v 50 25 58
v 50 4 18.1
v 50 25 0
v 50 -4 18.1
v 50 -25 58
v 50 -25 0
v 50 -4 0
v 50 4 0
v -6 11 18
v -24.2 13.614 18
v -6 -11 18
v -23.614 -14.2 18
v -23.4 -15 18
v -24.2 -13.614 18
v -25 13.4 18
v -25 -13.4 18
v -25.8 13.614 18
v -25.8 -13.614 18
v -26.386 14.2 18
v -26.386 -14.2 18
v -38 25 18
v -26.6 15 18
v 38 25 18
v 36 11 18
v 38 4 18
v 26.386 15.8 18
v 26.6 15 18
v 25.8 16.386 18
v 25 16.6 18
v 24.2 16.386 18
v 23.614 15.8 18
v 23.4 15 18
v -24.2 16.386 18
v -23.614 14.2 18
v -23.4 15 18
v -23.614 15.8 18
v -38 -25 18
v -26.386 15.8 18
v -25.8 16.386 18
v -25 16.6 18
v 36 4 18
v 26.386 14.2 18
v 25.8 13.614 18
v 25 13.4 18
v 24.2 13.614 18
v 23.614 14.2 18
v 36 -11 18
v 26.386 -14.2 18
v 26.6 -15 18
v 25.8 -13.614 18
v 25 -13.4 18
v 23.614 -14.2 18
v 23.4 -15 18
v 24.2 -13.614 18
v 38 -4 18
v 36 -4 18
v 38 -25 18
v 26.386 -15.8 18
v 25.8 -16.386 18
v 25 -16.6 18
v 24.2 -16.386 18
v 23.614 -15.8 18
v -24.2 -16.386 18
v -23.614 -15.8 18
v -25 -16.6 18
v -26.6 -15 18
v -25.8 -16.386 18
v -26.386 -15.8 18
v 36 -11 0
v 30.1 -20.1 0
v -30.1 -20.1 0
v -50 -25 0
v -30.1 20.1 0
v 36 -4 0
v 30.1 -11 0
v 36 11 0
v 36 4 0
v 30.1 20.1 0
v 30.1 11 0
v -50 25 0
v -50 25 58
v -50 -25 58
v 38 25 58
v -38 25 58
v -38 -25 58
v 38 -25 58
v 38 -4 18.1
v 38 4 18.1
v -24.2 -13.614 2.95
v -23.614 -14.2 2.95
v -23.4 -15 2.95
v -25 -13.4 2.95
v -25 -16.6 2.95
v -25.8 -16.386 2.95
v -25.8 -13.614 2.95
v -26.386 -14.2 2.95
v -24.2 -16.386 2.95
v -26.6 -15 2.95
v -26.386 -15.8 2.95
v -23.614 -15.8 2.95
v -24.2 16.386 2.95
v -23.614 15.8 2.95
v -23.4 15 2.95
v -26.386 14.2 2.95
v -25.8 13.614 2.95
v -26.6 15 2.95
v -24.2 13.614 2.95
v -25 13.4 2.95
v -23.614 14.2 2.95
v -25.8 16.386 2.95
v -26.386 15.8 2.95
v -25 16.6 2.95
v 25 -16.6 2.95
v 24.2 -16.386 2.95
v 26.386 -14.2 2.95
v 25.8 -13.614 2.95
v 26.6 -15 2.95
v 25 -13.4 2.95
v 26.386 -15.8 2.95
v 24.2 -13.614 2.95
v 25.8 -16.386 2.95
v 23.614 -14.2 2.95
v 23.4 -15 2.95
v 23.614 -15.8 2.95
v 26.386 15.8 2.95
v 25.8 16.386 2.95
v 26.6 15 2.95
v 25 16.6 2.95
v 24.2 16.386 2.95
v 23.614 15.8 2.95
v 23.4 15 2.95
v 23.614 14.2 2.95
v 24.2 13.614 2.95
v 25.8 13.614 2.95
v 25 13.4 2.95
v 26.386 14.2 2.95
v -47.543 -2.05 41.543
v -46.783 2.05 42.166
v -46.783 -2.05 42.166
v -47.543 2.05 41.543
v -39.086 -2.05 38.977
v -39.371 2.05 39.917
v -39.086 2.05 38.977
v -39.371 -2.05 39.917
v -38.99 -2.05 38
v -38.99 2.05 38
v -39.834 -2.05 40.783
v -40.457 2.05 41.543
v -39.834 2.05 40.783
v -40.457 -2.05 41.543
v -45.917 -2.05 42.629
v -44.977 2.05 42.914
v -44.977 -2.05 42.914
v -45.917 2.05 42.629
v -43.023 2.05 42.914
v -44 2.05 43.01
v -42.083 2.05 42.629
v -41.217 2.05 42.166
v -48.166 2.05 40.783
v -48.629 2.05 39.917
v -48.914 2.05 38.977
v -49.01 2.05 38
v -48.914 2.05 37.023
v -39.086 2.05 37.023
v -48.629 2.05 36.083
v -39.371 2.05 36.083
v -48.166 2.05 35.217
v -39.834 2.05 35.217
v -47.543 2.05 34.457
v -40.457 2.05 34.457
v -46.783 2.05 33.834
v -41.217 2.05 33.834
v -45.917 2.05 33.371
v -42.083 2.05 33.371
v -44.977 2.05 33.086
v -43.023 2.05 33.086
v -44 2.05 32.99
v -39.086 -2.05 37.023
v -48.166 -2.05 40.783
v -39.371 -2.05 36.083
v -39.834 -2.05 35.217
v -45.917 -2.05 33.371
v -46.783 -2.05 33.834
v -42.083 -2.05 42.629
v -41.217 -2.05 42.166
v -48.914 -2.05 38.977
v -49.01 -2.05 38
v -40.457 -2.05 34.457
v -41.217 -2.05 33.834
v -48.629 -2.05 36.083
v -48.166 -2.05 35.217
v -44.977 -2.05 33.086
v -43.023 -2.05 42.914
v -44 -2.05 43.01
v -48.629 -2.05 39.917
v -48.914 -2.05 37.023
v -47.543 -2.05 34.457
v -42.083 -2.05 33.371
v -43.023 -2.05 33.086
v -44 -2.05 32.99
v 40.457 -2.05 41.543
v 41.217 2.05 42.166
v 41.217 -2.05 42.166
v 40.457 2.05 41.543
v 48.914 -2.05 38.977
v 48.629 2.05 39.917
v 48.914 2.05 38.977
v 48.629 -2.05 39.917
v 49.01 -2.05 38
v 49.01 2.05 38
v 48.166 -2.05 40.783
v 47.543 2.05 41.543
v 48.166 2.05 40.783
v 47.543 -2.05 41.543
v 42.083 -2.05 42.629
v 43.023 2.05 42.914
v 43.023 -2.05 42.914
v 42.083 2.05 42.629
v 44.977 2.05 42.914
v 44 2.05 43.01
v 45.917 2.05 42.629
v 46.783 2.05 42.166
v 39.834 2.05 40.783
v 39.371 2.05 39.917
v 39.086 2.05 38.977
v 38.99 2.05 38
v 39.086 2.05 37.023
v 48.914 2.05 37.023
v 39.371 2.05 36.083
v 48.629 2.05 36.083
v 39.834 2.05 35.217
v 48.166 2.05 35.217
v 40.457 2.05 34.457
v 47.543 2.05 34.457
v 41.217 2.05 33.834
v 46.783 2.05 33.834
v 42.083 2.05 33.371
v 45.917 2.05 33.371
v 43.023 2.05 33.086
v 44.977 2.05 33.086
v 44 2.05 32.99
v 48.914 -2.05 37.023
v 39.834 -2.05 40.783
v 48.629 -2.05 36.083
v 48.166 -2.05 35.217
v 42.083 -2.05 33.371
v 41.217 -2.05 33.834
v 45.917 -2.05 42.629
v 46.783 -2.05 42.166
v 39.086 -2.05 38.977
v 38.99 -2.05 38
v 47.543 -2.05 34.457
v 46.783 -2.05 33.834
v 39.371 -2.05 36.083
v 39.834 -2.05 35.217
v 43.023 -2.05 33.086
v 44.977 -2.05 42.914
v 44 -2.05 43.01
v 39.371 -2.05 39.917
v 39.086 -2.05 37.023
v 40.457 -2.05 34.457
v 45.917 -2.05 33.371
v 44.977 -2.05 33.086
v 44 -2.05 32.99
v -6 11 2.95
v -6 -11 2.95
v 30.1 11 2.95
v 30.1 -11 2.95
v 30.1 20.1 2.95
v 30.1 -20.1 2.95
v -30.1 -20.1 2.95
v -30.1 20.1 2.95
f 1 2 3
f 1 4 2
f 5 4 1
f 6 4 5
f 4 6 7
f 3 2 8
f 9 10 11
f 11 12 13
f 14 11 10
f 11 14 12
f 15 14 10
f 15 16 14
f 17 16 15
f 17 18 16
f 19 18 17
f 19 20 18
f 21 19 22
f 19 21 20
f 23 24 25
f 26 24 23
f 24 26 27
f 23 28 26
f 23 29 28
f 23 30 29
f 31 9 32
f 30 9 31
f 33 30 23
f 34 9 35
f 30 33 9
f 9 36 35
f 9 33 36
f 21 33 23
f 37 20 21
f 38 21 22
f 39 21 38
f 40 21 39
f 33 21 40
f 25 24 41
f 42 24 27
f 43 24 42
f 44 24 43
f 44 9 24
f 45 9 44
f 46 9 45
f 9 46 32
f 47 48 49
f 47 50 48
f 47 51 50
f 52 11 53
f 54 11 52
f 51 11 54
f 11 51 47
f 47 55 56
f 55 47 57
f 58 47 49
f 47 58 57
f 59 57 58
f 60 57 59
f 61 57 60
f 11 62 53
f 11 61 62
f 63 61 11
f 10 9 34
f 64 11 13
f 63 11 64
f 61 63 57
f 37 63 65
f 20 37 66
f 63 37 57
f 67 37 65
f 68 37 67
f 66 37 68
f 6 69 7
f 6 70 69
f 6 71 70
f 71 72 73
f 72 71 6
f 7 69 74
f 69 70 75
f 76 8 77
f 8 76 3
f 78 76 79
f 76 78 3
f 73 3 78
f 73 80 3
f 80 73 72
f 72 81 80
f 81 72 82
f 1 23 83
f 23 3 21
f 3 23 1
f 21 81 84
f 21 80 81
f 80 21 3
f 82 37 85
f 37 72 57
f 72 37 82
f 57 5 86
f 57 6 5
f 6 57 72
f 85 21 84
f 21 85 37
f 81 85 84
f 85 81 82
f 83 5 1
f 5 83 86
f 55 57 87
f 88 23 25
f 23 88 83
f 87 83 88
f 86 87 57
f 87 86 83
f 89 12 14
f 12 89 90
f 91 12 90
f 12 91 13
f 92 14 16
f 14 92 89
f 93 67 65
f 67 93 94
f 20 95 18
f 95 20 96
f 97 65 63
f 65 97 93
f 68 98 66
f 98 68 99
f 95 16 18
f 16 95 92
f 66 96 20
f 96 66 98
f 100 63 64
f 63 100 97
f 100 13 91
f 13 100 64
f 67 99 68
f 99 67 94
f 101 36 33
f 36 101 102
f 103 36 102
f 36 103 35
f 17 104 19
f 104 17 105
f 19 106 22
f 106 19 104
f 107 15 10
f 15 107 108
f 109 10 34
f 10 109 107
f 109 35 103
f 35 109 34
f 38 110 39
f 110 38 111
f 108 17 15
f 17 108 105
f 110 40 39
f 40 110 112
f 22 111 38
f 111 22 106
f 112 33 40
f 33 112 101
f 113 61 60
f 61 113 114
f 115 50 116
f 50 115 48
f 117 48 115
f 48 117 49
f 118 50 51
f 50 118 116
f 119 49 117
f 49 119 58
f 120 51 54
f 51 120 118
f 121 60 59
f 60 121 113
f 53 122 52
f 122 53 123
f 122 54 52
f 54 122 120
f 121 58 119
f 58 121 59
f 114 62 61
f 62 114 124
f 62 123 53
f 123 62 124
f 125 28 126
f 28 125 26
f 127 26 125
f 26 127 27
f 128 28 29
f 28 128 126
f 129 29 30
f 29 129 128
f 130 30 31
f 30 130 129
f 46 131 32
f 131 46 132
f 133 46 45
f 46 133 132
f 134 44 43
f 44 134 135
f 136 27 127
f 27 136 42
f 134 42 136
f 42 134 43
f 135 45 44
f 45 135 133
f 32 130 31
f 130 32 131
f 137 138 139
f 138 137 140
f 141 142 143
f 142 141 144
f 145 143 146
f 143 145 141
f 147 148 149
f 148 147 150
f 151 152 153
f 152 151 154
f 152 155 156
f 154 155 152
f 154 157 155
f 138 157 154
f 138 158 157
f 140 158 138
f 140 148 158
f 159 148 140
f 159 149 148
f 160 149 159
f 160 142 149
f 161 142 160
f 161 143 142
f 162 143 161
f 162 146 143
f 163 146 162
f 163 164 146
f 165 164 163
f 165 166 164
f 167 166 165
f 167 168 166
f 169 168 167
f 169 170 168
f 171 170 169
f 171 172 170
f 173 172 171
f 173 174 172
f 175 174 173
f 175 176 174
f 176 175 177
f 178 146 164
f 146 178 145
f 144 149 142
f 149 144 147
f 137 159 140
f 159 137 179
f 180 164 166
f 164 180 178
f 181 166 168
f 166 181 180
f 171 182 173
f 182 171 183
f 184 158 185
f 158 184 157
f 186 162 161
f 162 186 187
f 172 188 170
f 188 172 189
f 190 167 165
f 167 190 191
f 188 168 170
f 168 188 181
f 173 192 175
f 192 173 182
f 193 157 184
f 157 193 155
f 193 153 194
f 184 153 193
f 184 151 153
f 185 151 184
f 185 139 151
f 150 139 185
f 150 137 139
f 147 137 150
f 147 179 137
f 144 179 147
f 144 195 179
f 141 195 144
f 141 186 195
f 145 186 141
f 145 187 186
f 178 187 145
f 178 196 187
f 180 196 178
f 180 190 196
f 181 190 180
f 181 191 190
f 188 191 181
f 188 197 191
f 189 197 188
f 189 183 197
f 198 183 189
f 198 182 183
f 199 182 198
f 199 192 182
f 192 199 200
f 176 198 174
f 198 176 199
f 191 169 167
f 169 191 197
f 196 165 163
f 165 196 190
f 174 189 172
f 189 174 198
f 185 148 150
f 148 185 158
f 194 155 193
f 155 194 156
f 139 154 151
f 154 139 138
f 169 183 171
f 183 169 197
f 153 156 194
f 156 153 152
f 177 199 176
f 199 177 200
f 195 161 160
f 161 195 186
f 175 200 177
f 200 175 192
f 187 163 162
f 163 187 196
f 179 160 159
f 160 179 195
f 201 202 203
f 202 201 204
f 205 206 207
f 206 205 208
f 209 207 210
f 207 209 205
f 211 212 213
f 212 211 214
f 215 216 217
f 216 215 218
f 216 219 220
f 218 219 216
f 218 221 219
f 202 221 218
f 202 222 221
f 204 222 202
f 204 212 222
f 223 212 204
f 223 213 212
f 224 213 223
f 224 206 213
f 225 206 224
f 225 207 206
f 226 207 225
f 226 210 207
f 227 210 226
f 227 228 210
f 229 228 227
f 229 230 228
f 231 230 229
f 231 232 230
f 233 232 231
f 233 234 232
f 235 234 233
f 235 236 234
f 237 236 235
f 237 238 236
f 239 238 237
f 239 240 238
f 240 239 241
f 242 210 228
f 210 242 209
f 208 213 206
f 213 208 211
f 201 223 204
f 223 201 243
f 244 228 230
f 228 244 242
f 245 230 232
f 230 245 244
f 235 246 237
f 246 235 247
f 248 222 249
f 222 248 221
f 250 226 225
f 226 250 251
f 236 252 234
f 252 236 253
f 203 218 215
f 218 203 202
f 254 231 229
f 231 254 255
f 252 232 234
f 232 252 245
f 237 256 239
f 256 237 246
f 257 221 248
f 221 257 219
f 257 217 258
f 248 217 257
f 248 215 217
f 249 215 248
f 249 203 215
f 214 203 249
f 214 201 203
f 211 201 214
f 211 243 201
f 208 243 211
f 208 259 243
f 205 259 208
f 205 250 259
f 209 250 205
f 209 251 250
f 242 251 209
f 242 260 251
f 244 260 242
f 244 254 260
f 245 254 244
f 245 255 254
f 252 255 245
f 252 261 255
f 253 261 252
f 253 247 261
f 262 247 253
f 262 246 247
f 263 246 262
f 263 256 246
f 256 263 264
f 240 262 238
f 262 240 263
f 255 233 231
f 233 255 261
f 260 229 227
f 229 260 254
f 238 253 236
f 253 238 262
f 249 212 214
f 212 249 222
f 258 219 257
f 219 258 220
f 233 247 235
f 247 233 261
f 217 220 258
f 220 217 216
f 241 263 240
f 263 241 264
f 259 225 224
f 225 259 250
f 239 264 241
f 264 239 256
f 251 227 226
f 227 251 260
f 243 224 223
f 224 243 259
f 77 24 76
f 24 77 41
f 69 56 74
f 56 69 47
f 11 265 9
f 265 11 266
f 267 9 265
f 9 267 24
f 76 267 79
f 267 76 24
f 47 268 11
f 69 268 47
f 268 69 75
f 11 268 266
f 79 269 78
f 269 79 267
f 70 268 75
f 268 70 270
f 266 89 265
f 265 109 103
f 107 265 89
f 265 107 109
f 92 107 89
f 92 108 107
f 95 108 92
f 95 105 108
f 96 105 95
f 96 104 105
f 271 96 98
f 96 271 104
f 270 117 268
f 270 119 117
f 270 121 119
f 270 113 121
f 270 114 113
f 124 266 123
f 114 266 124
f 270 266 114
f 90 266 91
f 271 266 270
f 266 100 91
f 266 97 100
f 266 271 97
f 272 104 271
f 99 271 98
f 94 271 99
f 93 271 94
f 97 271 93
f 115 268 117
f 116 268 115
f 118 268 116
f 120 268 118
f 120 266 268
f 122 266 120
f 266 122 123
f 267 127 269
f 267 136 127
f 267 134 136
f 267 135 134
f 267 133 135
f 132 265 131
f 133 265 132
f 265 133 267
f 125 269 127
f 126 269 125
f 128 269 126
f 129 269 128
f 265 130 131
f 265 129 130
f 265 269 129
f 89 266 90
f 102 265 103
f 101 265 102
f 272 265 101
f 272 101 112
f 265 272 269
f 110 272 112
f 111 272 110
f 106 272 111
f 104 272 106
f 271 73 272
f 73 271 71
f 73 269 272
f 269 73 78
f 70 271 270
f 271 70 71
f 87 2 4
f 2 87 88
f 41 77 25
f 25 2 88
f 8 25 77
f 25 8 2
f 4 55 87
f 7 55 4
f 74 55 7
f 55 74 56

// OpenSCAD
// ===========================================================================
// HULL-FRAME COORDINATE STANDARD - Rev R1 (2026-06-11).  See CLAUDE.md.
//   Hull frame (canonical for ALL design artifacts): X = +port (left),
//   Y = +aft (back), Z = +dorsal (up); origin = SerenityAssembly.FCStd
//   world origin.  Primary-component STLs published to airframe/stls/
//   are stored directly in hull frame, baked by tools/bake_hull_frame.py
//   (marker 'SerenityUAV HULL-FRAME R1' in the binary STL header).
//   NEVER re-bake a mesh derived from an already-baked file.
//   This file:
//     Skipper ground-support equipment - part-local print frame.  The
//     aircraft hull-frame standard does not apply to GCS hardware
//     (documented exception, like the avionics KiCad files).
// ===========================================================================
/*
 * skipper_gimbal_tilt.scad
 * Tilt (elevation) stage for Skipper GCS directional antenna gimbal
 *
 * Author:  Steve Griffing, PE(CSE), CISSP-ISSEP, CPP
 * License: CERN-OHL-W-2.0 — see LICENSES/CERN-OHL-W 2.0 (SPDX-License-Identifier: CERN-OHL-W-2.0)
 * Revision: R (2026-06-11)
 *
 * Description:
 *   The tilt stage rotates the antenna mounting plate about the horizontal
 *   (Y) axis.  It consists of:
 *     - Yoke frame that bolts to the pan turret top boss
 *     - Antenna mount plate (from skipper_gimbal_mount.scad) pivots on a
 *       4 mm CF pivot rod through two MF104ZZ bearings in the yoke ears
 *     - DS3218MG servo mounted in the yoke body, driving the mount plate
 *       via a pushrod / sector gear
 *     - AS5600 magnetic encoder in the yoke, reading a disc magnet on the
 *       pivot rod for elevation position feedback
 *     - Travel limits: −10° (10° below horizontal) to +90° (vertical up)
 *       Hard stops at −15° and +95° (printed into yoke walls)
 *
 * Material: CF-PETG, 0.15 mm layers, 40% infill, 4 perimeters
 *
 * Mesh verification: run after every geometry change.
 *   openscad -o skipper_gimbal_tilt.stl skipper_gimbal_tilt.scad
 *   python3 tools/validate_stls.py
 */

/* ---------------------------------------------------------------------------
 * Render mode: 0 = yoke, 1 = pivot arm stub (attach to mount plate), 2 = exploded
 * ---------------------------------------------------------------------------*/
RENDER_MODE = 0;

/* ---------------------------------------------------------------------------
 * Pivot rod and bearings (same MF104ZZ as nacelle pivot — M1 reuse)
 * ---------------------------------------------------------------------------*/
PIVOT_D     = 4.0;  /* CF pivot rod OD mm                                  */
BRG_OD      = 10.0; /* MF104ZZ bearing OD mm                               */
BRG_ID      = 4.0;  /* MF104ZZ bearing ID mm                               */
BRG_W       = 4.0;  /* MF104ZZ bearing width mm                            */
BRG_PRESS_TOL = 0.02;

/* ---------------------------------------------------------------------------
 * Yoke geometry
 * ---------------------------------------------------------------------------*/
YOKE_W      = 100.0; /* Yoke total width (ear tip to ear tip) mm           */
YOKE_D      = 50.0;  /* Yoke depth (fore-aft) mm                           */
YOKE_BASE_H = 18.0;  /* Yoke base height (below pivot axis) mm             */
EAR_W       = 12.0;  /* Ear plate thickness mm                             */
EAR_H       = 40.0;  /* Ear plate height above base mm                     */
PIVOT_Z     = YOKE_BASE_H + EAR_H / 2; /* Pivot axis height from yoke base mm */

/* ---------------------------------------------------------------------------
 * Servo pocket (DS3218MG, same as aircraft nacelle servos)
 * ---------------------------------------------------------------------------*/
SERVO_W     = 42.0;
SERVO_D     = 22.0;
SERVO_H     = 36.0;  /* Depth pocket below yoke top face                   */

/* ---------------------------------------------------------------------------
 * Base attachment (bolts to pan turret TILT_MOUNT boss from skipper_gimbal_pan.scad)
 * ---------------------------------------------------------------------------*/
BASE_BOSS_W = 60.0;  /* Must match TILT_MOUNT_W in pan SCAD               */
BASE_BOSS_D = 40.0;  /* Must match TILT_MOUNT_D in pan SCAD               */
BASE_BOSS_H = 6.0;   /* Matching socket depth mm                           */

/* ===========================================================================
 * Modules
 * ===========================================================================*/

module bearing_pocket(x, y, z) {
    /*
     * MF104ZZ press-fit pocket in ear wall.
     * Centred at (x, y, z) with bore along Y axis.
     */
    translate([x, y, z]) {
        rotate([90, 0, 0]) {
            cylinder(d = BRG_OD + BRG_PRESS_TOL, h = BRG_W + 0.1, center = true, $fn = 32);
        }
    }
}

module yoke() {
    /*
     * Yoke frame: U-shaped with flat base and two ears.  Servo mounts in the
     * base body.  Pivot rod runs through both ears along the Y axis.
     */
    difference() {
        union() {
            /* Base body */
            translate([0, 0, YOKE_BASE_H / 2]) {
                cube([YOKE_W, YOKE_D, YOKE_BASE_H], center = true);
            }

            /* Left ear */
            translate([-YOKE_W / 2 + EAR_W / 2, 0, YOKE_BASE_H + EAR_H / 2]) {
                cube([EAR_W, YOKE_D, EAR_H], center = true);
            }

            /* Right ear */
            translate([YOKE_W / 2 - EAR_W / 2, 0, YOKE_BASE_H + EAR_H / 2]) {
                cube([EAR_W, YOKE_D, EAR_H], center = true);
            }
        }

        /* Bearing pockets in ears */
        bearing_pocket(-YOKE_W / 2 + EAR_W / 2, 0, PIVOT_Z);
        bearing_pocket( YOKE_W / 2 - EAR_W / 2, 0, PIVOT_Z);

        /* Servo pocket in base body */
        translate([15, 0, YOKE_BASE_H - SERVO_H / 2]) {
            cube([SERVO_W, SERVO_D, SERVO_H + 0.1], center = true);
        }

        /* Base attachment socket (receives pan turret TILT_MOUNT boss) */
        translate([0, 0, -0.1]) {
            cube([BASE_BOSS_W + 0.2, BASE_BOSS_D + 0.2, BASE_BOSS_H + 0.1], center = true);
        }

        /* M3 bolt holes through base for turret attachment (4×) */
        for (xi = [-1, 1]) {
            for (yi = [-1, 1]) {
                translate([xi * (BASE_BOSS_W / 2 - 5), yi * (BASE_BOSS_D / 2 - 5), -0.1]) {
                    cylinder(d = 3.2, h = BASE_BOSS_H + YOKE_BASE_H + 0.2, $fn = 12);
                }
            }
        }

        /* Wire relief from servo pocket to yoke exterior */
        translate([15 + SERVO_W / 2, 0, YOKE_BASE_H / 2]) {
            cube([YOKE_W - 30 - SERVO_W / 2 + 1, 8, YOKE_BASE_H + 0.2], center = true);
        }
    }
}

/* ===========================================================================
 * Render dispatch
 * ===========================================================================*/
if (RENDER_MODE == 0) {
    yoke();
} else {
    /* Exploded — tilt yoke only for now; antenna mount plate in separate SCAD */
    yoke();
}
